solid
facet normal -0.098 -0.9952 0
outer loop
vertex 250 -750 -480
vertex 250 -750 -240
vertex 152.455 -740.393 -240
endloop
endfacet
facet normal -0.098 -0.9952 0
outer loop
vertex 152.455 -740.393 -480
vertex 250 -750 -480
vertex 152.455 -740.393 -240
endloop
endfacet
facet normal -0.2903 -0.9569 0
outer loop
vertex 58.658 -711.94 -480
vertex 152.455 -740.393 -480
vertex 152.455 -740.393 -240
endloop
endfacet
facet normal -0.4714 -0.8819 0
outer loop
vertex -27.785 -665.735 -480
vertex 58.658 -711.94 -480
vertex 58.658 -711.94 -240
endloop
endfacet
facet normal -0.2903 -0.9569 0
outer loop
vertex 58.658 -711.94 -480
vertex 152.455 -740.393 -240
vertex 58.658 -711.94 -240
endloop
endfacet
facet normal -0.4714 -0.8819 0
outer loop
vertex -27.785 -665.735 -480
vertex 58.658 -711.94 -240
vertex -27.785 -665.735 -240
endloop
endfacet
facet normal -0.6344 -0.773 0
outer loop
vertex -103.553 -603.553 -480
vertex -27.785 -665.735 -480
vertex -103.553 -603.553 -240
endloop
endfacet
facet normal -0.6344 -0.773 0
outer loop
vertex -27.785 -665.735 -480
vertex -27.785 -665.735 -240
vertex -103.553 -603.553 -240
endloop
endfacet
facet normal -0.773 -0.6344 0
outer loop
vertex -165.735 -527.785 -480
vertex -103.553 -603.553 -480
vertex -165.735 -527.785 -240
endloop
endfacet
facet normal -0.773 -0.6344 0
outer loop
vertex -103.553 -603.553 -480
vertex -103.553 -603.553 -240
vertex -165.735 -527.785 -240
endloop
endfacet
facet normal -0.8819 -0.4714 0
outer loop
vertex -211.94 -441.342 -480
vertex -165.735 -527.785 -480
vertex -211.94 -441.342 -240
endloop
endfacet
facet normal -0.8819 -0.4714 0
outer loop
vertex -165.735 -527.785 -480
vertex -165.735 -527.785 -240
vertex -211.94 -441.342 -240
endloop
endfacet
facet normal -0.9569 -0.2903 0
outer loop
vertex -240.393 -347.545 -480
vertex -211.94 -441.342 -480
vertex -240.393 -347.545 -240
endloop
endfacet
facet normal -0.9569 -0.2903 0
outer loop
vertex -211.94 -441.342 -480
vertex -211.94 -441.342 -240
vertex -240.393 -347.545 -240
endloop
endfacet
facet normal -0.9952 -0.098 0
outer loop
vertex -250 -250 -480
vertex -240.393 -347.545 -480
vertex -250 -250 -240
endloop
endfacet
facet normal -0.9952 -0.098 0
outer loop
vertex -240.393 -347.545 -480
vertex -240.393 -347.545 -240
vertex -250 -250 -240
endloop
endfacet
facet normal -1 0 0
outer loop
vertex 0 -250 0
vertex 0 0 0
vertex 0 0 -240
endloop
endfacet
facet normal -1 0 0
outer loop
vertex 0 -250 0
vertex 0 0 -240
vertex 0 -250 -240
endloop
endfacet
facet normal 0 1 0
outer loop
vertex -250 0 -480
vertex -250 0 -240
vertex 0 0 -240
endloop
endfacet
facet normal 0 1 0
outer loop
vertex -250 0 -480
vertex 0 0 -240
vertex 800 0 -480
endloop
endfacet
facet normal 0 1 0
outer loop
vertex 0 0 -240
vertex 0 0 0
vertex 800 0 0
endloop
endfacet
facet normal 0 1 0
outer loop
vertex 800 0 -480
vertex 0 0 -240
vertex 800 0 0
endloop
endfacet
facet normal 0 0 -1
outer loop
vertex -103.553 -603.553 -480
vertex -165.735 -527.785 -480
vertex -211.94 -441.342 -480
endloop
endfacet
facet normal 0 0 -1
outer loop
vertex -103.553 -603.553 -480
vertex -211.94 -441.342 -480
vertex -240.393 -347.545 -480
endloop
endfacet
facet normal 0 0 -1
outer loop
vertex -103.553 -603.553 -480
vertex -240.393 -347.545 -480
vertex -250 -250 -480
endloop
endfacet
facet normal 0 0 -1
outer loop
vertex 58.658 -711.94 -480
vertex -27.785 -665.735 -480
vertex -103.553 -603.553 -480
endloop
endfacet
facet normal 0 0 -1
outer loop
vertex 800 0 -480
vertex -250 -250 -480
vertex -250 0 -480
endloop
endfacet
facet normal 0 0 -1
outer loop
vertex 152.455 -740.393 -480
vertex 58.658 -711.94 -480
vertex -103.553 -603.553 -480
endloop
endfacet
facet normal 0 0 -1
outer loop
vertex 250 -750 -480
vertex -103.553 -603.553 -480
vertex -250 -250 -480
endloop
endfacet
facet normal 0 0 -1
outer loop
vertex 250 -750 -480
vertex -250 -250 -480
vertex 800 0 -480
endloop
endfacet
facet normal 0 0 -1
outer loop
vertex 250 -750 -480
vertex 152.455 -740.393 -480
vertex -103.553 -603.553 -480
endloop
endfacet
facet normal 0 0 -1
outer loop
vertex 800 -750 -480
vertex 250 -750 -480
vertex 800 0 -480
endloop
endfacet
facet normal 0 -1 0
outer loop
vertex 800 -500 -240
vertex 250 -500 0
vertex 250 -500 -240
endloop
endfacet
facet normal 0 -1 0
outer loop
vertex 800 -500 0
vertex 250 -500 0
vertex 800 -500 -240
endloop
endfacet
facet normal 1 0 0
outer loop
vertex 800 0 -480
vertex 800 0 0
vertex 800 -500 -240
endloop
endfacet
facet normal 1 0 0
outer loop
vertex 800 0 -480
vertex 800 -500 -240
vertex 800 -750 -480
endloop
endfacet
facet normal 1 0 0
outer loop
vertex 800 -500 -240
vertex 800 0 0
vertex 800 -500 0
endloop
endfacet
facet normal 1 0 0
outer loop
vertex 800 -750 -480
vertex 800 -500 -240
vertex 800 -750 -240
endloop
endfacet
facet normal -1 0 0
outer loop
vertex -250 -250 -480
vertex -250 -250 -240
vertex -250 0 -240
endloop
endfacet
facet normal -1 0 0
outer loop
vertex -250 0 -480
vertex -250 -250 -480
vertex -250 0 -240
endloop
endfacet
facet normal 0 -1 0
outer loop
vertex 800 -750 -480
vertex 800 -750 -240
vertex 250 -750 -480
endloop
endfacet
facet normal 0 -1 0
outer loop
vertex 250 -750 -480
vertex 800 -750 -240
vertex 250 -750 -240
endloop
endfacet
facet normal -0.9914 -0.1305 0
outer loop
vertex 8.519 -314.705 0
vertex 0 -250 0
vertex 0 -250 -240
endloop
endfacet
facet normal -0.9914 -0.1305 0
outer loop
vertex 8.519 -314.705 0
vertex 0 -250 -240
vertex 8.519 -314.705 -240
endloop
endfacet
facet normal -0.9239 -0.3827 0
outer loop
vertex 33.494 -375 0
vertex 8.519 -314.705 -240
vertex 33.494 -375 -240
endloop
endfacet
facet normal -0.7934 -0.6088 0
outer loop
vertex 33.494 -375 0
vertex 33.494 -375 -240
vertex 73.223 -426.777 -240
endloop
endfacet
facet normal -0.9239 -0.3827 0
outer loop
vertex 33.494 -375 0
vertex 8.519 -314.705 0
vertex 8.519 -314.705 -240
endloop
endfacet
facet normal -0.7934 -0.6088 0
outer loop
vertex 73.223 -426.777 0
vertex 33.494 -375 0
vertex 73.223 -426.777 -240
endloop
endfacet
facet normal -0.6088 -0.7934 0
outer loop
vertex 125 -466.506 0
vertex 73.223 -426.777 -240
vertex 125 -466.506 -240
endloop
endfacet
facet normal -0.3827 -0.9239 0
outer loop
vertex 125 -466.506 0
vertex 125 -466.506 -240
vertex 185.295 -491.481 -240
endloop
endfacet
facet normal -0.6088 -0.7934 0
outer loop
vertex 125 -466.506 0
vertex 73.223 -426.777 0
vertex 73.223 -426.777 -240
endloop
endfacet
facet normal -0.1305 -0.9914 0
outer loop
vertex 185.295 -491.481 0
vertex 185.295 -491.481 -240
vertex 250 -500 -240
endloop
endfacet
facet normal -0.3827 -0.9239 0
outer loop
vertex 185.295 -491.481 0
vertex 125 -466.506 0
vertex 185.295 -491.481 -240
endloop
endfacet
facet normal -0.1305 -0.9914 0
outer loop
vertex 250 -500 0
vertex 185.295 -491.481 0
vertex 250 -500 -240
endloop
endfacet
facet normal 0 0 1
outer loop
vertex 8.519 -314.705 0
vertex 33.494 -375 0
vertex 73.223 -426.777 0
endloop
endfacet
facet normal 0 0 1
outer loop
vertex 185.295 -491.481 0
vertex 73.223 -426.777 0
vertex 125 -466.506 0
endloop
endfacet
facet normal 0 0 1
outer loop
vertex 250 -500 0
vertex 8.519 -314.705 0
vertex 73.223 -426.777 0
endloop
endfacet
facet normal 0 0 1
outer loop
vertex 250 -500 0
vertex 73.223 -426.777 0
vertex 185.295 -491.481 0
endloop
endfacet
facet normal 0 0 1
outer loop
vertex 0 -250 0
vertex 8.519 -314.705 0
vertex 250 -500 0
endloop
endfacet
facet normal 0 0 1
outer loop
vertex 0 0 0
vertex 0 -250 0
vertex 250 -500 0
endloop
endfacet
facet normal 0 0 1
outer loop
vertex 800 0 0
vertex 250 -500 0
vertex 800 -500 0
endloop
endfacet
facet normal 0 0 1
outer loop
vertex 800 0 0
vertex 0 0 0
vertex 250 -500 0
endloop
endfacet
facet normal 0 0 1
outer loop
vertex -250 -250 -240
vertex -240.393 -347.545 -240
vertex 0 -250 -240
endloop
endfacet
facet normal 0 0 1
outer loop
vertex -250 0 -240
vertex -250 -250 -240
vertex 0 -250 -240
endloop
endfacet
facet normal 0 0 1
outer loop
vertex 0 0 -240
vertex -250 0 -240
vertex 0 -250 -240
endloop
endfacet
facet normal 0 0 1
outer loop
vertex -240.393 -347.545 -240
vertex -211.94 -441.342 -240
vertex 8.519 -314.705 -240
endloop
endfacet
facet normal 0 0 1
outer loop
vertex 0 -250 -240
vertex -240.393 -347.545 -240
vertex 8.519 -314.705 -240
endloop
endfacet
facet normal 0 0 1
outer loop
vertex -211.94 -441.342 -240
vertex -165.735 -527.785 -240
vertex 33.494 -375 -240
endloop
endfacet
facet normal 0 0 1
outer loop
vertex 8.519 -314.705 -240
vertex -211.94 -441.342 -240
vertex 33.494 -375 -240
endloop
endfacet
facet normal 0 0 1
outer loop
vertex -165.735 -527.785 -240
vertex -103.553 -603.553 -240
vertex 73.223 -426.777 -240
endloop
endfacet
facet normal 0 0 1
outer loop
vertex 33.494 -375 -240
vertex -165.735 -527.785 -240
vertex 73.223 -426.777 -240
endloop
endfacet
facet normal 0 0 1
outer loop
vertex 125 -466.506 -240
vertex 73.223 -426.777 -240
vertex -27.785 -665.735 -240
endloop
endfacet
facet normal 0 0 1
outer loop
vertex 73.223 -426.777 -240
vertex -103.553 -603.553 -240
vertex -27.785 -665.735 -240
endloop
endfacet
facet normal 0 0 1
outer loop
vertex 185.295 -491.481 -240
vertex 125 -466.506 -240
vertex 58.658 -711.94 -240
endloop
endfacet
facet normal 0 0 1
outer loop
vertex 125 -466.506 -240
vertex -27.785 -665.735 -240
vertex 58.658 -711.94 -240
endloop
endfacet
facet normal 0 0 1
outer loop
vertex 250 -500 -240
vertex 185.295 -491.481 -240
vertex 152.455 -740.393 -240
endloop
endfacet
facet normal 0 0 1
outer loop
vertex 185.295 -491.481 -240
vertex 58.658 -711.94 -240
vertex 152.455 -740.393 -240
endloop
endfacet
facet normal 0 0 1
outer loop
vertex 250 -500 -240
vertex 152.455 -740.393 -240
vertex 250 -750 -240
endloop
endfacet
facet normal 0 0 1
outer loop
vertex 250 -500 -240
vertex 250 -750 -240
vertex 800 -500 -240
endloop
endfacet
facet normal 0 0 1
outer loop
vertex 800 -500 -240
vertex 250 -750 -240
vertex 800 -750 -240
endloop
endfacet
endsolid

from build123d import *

# Parameters (mm, degrees)
F1_DEPTH = 240
F3_DEPTH = 240


with BuildPart() as f1:
    # F0 (on Top) → F1 (new body)
    with BuildSketch(Plane.XY):
        with BuildLine():
            Line((800, 0), (0, 0))
            Line((0, 0), (0, -250))
            ThreePointArc((0, -250), (73.223305, -426.776695), (250, -500))
            Line((250, -500), (800, -500))
            Line((800, -500), (800, 0))
        make_face()
    extrude(amount=-F1_DEPTH)

    # F2 (on face) → F3 (join)
    with BuildSketch(Plane(origin=(0, 0, -240), x_dir=(1, 0, 0), z_dir=(0, 0, -1))):
        with BuildLine():
            ThreePointArc((250, 750), (-103.553391, 603.553391), (-250, 250))
            Line((-250, 250), (-250, 0))
            Line((-250, 0), (800, 0))
            Line((800, 0), (800, 750))
            Line((800, 750), (250, 750))
        make_face()
    extrude(amount=F3_DEPTH)


solid = f1.part
